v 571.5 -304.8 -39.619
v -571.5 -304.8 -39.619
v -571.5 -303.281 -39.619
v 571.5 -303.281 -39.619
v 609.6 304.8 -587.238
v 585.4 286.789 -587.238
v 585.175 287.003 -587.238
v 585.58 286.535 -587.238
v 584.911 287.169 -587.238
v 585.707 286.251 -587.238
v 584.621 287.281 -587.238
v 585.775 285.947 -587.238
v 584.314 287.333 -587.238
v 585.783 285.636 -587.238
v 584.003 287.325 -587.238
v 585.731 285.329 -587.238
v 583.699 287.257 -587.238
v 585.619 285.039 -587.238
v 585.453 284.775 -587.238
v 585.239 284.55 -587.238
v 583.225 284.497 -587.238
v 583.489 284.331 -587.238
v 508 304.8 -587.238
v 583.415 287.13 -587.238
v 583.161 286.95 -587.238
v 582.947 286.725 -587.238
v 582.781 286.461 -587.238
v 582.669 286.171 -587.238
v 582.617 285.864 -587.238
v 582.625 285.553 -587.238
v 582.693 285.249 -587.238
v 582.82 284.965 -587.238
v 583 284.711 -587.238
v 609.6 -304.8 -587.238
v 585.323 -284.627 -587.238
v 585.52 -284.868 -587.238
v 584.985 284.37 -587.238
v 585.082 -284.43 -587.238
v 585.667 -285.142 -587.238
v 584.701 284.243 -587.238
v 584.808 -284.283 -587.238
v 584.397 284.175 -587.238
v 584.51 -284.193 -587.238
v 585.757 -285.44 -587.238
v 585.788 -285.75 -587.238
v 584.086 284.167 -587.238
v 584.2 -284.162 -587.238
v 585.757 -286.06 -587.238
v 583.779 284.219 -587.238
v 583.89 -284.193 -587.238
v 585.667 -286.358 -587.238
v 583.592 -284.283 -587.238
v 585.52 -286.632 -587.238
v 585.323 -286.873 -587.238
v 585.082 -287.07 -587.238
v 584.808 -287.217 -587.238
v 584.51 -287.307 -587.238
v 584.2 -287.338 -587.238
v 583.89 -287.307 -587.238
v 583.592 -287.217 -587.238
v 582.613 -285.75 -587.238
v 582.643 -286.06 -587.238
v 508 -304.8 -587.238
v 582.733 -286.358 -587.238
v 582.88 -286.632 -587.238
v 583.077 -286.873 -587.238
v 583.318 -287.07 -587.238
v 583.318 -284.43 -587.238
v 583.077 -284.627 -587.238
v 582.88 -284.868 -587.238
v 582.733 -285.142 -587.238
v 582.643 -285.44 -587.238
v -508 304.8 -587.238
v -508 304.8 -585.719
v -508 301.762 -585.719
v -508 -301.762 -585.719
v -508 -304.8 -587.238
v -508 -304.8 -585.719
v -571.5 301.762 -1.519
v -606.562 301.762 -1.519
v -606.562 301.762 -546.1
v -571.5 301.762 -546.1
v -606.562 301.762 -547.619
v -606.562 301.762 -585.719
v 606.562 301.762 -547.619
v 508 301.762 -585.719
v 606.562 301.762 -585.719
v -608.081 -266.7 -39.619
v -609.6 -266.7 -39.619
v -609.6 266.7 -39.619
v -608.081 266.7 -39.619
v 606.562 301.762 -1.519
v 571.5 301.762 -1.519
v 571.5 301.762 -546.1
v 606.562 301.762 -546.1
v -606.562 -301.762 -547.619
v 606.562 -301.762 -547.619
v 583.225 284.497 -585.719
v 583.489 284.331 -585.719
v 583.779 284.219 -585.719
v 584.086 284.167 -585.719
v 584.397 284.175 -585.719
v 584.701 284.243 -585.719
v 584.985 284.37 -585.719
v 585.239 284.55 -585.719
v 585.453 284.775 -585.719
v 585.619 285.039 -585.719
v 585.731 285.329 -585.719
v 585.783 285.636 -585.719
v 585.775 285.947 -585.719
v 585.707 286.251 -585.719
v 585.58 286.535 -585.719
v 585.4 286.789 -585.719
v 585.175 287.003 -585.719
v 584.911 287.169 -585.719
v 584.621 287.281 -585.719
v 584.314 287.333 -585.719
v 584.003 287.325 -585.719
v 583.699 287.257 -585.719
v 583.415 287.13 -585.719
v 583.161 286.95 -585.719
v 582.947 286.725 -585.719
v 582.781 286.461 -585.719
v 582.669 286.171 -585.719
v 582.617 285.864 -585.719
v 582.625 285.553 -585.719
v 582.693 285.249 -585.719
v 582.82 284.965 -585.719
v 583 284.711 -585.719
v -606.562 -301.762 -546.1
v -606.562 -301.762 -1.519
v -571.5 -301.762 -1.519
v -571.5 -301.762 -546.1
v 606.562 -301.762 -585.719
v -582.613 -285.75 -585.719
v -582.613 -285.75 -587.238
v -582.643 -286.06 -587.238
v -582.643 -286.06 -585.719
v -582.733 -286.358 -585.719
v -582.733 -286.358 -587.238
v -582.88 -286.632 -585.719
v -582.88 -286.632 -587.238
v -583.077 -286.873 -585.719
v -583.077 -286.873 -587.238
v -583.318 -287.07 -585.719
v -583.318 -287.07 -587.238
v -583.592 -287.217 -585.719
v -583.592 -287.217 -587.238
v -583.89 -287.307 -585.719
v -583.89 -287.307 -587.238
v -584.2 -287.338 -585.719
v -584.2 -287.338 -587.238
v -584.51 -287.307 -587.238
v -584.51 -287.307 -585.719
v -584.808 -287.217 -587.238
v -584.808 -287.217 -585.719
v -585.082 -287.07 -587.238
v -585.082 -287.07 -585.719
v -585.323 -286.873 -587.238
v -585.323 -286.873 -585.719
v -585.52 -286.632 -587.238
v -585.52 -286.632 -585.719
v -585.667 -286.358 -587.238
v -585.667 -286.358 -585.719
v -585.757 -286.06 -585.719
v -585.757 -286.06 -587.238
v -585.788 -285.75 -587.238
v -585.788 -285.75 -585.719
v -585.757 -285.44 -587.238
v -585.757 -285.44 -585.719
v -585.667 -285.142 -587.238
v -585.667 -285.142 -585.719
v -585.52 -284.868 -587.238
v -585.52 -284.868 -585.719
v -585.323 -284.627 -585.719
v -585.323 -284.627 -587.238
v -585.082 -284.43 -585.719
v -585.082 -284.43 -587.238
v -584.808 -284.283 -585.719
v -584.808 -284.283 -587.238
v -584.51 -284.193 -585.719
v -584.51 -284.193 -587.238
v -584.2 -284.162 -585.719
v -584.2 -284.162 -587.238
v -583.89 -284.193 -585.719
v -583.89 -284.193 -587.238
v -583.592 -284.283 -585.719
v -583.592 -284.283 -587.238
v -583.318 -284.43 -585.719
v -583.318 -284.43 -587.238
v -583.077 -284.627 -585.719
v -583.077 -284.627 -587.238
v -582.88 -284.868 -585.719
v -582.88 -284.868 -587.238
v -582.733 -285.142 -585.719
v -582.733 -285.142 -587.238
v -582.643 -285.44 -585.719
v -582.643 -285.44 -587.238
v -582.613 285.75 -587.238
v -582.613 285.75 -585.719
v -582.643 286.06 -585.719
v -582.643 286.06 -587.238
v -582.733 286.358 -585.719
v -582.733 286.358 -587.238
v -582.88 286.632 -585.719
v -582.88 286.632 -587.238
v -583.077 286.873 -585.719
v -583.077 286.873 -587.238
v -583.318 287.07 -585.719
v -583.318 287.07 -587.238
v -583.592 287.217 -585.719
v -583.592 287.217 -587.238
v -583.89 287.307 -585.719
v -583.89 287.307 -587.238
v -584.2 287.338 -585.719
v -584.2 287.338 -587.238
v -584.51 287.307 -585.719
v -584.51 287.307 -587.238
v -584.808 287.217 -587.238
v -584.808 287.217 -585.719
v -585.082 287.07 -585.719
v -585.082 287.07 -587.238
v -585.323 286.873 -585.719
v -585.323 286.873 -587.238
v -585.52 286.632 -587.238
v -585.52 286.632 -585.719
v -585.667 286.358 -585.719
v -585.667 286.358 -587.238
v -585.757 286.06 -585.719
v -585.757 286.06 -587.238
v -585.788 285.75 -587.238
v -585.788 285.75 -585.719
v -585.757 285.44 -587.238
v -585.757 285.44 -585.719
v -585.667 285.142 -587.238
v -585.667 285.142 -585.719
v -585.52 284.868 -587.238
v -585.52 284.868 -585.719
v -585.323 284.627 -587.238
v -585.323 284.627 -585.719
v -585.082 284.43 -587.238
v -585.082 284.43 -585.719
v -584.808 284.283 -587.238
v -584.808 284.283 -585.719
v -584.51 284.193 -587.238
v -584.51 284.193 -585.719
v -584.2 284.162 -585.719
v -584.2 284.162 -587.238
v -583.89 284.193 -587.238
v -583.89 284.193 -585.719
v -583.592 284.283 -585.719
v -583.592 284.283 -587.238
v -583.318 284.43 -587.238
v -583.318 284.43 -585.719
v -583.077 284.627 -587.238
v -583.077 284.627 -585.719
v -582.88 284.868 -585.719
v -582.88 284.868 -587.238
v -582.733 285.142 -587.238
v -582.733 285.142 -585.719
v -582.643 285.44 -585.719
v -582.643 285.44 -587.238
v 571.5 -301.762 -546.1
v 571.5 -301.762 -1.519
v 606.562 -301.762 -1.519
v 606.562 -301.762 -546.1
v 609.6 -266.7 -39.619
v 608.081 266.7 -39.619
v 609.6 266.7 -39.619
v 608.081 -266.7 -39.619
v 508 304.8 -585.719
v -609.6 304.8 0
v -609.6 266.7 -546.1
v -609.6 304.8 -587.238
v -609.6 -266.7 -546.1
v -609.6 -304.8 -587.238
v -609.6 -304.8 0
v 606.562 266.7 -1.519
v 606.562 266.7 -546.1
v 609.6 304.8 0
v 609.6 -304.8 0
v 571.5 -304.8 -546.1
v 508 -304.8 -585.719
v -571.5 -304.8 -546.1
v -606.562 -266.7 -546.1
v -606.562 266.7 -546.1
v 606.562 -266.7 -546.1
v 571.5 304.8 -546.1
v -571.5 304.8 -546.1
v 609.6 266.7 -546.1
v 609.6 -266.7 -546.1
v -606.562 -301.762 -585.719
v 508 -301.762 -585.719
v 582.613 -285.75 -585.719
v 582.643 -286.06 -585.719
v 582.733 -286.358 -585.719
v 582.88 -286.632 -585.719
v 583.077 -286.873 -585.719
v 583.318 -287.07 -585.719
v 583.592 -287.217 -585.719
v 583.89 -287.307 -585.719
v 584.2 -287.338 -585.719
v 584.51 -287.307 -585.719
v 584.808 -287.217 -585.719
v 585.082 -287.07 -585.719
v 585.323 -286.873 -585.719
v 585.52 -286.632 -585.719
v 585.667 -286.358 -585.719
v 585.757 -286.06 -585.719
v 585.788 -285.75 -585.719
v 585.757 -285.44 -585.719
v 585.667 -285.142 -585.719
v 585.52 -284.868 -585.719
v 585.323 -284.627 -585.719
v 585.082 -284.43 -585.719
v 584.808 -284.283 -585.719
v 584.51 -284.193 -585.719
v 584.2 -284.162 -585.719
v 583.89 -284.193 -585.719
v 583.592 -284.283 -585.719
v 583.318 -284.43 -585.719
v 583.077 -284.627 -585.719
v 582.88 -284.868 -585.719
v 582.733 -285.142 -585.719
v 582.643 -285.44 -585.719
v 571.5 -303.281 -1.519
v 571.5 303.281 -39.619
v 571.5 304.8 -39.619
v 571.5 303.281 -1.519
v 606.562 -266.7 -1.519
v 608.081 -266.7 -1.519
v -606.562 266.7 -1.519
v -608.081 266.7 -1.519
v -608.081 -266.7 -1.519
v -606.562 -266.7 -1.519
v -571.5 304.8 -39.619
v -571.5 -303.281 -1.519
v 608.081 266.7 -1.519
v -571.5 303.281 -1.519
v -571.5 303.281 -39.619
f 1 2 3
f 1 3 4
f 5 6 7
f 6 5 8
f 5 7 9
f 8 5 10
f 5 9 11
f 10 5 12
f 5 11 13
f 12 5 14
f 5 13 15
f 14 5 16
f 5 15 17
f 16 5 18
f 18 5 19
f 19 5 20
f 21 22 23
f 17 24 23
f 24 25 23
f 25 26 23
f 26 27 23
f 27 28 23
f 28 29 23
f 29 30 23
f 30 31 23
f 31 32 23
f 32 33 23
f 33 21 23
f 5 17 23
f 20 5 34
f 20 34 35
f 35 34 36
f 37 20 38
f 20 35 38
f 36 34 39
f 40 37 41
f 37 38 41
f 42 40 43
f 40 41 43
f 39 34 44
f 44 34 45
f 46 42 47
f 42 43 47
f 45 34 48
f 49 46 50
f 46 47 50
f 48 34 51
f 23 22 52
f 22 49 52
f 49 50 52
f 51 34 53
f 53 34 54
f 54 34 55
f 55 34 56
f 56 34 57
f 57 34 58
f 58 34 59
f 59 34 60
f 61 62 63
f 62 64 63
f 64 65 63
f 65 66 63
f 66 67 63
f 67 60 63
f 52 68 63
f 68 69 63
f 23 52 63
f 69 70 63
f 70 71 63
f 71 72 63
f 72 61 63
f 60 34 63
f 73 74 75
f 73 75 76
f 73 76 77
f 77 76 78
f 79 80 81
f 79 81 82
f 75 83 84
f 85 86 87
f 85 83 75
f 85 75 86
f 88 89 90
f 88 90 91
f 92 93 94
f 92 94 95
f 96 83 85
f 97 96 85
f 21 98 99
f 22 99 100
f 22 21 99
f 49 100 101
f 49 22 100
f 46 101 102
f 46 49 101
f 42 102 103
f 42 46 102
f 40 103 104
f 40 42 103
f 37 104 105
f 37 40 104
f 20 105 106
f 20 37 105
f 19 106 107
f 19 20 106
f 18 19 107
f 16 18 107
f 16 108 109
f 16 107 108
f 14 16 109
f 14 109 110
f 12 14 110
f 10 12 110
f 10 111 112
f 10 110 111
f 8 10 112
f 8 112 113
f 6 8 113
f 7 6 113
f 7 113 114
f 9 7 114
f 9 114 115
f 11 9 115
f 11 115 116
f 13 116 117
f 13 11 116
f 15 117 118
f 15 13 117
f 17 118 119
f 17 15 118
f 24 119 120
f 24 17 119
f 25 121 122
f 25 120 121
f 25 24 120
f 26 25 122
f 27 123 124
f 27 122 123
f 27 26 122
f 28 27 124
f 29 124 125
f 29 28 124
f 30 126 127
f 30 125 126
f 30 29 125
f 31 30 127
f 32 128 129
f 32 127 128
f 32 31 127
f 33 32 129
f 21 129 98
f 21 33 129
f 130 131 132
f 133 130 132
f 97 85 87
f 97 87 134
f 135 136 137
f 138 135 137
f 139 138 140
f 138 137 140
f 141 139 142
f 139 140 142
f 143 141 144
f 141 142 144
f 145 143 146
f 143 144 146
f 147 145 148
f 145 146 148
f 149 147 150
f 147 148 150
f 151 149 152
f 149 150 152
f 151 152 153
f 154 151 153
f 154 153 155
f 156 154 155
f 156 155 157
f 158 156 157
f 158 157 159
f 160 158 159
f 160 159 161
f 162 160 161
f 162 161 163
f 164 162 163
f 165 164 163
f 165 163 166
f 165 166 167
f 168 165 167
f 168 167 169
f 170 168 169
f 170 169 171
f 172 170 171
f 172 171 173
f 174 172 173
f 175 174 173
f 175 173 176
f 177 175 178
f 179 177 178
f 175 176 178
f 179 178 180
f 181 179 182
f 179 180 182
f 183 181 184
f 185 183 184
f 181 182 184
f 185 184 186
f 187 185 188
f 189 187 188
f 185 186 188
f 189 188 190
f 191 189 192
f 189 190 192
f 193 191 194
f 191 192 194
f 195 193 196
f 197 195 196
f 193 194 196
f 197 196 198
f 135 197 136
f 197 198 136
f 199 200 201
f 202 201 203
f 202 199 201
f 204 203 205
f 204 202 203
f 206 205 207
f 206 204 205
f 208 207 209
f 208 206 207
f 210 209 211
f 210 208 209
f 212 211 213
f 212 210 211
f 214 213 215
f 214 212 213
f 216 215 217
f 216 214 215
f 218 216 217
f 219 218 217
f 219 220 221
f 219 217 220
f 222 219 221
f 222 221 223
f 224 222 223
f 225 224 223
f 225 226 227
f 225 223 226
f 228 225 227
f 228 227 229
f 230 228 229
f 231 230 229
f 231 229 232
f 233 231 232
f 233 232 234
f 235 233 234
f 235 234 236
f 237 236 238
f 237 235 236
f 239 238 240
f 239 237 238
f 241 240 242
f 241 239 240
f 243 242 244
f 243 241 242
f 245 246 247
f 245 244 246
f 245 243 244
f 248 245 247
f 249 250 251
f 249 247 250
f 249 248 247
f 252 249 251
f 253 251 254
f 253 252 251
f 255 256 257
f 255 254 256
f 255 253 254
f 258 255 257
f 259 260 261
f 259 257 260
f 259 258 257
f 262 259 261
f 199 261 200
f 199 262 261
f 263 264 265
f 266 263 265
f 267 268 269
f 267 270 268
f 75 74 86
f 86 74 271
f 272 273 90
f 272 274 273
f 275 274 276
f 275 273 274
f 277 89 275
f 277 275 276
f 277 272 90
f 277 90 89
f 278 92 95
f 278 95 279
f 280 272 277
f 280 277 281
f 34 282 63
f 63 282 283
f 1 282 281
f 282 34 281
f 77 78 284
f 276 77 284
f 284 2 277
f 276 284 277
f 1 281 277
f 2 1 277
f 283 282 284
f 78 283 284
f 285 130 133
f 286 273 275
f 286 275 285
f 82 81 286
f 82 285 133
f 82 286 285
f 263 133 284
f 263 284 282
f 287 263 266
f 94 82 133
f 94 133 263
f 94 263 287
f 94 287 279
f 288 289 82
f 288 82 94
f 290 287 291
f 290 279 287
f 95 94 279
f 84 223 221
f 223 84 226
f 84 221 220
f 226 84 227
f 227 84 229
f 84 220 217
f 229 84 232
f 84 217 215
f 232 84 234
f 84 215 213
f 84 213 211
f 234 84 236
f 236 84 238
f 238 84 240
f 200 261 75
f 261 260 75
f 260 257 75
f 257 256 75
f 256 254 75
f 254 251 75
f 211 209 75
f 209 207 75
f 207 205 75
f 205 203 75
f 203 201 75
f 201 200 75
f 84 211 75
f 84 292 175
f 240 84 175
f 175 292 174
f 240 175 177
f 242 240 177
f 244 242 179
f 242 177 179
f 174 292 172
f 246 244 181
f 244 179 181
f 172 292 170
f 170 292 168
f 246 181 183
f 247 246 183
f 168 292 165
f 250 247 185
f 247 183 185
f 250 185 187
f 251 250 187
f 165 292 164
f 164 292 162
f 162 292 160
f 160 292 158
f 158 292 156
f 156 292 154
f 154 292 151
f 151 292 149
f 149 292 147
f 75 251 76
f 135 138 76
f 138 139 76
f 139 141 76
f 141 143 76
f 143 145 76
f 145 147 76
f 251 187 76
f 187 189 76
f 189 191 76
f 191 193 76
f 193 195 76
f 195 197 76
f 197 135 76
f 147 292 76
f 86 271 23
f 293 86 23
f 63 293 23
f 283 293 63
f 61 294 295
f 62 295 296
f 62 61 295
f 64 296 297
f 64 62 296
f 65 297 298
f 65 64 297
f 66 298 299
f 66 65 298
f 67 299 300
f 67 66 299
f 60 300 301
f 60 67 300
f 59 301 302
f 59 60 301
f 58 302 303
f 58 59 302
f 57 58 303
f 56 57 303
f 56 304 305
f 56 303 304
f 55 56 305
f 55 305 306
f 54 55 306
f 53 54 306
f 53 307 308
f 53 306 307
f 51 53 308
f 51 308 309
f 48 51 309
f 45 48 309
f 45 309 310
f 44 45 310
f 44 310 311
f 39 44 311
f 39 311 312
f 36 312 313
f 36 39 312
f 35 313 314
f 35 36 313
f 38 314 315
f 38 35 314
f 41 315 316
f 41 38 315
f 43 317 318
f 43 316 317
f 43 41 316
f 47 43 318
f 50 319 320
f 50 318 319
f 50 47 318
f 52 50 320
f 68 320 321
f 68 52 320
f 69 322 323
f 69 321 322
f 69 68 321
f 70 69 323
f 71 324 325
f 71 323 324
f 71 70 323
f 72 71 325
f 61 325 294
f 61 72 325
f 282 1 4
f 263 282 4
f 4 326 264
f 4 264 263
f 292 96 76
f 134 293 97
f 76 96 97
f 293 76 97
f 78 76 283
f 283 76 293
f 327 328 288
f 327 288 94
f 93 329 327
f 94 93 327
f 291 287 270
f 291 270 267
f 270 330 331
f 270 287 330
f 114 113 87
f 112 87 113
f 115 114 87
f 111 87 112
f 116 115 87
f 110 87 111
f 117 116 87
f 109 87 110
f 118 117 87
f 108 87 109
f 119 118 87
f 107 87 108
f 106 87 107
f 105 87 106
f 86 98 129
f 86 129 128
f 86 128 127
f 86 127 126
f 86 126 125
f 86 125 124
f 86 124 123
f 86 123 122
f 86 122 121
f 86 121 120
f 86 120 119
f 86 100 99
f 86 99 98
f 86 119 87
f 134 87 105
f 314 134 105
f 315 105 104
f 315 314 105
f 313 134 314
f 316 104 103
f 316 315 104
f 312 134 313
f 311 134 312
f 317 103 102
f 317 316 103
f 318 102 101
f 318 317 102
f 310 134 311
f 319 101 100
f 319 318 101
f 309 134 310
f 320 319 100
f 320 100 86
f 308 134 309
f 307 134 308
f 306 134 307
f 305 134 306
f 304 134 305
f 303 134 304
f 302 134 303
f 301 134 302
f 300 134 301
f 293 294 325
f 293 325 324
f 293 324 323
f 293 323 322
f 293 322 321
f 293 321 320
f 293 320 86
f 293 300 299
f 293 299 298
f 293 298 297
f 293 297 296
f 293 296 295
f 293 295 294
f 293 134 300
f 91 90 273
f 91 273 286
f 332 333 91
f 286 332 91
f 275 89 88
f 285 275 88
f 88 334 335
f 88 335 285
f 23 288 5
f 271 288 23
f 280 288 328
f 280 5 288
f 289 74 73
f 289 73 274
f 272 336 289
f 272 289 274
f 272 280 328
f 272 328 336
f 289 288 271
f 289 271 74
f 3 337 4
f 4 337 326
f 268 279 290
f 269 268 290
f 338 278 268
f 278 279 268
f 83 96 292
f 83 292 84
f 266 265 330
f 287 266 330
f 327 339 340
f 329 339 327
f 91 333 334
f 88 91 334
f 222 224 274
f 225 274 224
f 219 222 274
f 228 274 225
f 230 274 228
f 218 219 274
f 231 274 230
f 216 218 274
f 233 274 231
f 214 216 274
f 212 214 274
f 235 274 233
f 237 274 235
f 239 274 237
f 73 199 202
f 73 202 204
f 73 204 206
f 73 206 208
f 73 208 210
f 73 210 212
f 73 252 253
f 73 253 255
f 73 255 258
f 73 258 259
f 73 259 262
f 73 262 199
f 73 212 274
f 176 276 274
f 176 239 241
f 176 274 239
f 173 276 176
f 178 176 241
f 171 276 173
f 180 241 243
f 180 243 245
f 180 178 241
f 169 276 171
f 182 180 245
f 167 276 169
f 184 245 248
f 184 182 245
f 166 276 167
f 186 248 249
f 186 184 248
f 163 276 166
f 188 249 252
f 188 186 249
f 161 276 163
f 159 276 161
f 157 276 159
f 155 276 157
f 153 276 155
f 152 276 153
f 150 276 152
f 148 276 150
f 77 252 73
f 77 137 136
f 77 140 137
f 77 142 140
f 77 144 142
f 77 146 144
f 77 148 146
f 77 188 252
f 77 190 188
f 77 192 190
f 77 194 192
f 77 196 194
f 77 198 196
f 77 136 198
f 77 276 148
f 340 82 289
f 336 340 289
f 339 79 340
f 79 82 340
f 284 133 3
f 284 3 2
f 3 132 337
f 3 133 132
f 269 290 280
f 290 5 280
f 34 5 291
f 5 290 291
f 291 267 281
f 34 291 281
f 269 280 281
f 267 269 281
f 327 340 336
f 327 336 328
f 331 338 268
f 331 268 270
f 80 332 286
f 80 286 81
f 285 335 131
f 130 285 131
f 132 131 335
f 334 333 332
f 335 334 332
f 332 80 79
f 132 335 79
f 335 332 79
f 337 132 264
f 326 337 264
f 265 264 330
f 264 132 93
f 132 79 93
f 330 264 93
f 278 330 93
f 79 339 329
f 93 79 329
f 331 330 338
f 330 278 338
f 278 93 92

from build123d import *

# Parameters (mm, degrees)
F0_W      = 1219.2
F0_H      = 609.6
F1_DEPTH  = 1.51892
F2_W      = 1219.2
F2_H      = 609.6
F2_W_2    = 1216.16216
F2_H_2    = 606.56216
F3_DEPTH  = 38.1
F5_DEPTH  = 584.2
F7_W      = 1219.2
F7_H      = 609.6
F8_DEPTH  = 1.51892
F9_W      = 1219.2
F9_H      = 609.6
F9_W_2    = 1213.12432
F9_H_2    = 603.52432
F10_DEPTH = 38.1
F11_W     = 101.6
F11_H     = 609.6
F12_DEPTH = 1.51892
F13_R     = 1.5875
F14_DEPTH = 1.651


# Not quite as in the source:
# - a pattern or mirror of a feature is missing from the dataset's text; its kind, count and spacing are read off the source's solid


with BuildPart() as f1:
    # F0 (on Top) → F1 (new body)
    with BuildSketch(Plane.XY):
        Rectangle(F0_W, F0_H)
    extrude(amount=-F1_DEPTH)

    # F2 (on face) → F3 (join)
    with BuildSketch(Plane(origin=(0, 0, -1.51892), x_dir=(1, 0, 0), z_dir=(0, 0, -1))):
        Rectangle(F2_W, F2_H)
        Rectangle(F2_W_2, F2_H_2, mode=Mode.SUBTRACT)
    extrude(amount=F3_DEPTH)

    # F4 (on face) → F5 (join)
    with BuildSketch(Plane(origin=(0, 0, -1.51892), x_dir=(1, 0, 0), z_dir=(0, 0, -1))):
        Polygon((-571.5, 301.76216), (-571.5, 304.8), (-609.6, 304.8), (-609.6, 266.7), (-606.56216, 266.7), (-606.56216, 301.76216), align=None)
        Polygon((571.5, 304.8), (571.5, 301.76216), (606.56216, 301.76216), (606.56216, 266.7), (609.6, 266.7), (609.6, 304.8), align=None)
    f5 = extrude(amount=F5_DEPTH)

    # F5_copies: F5 across plane
    add(f5.mirror(Plane.ZX))

    # F7 (on offset) → F8 (join)
    with BuildSketch(Plane.XY.offset(-546.1)):
        Rectangle(F7_W, F7_H)
    extrude(amount=-F8_DEPTH)

    # F9 (on face) → F10 (join)
    with BuildSketch(Plane(origin=(0, 0, -547.61892), x_dir=(1, 0, 0), z_dir=(0, 0, -1))):
        Rectangle(F9_W, F9_H)
        Rectangle(F9_W_2, F9_H_2, mode=Mode.SUBTRACT)
    extrude(amount=F10_DEPTH)

    # F11 (on face) → F12 (join)
    with BuildSketch(Plane(origin=(0, 0, -585.71892), x_dir=(1, 0, 0), z_dir=(0, 0, -1))):
        with Locations((-558.8, 0)):
            Rectangle(F11_W, F11_H)
    f12 = extrude(amount=F12_DEPTH)

    # F12_copies: F12 across plane
    add(f12.mirror(Plane(origin=(0, 0, 0), x_dir=(0, 0, 1), z_dir=(1, 0, 0))))

    # F13 (on face) → F14 (cut)
    with BuildSketch(Plane(origin=(0, 0, -587.23784), x_dir=(1, 0, 0), z_dir=(0, 0, -1))):
        with Locations((-584.2, 285.75)):
            Circle(F13_R)
    f14 = extrude(amount=-F14_DEPTH, mode=Mode.SUBTRACT)

    # F14_copies: F14 across plane
    add(f14.mirror(Plane(origin=(0, 0, 0), x_dir=(0, 0, 1), z_dir=(1, 0, 0))), mode=Mode.SUBTRACT)

    # F14_copies1: F14 across plane
    add(f14.mirror(Plane.ZX), mode=Mode.SUBTRACT)

    # F14_copies2: F14 across plane
    add(f14.mirror(Plane(origin=(0, 0, 0), x_dir=(-0.4393852473, 0.8982987278, 0), z_dir=(0.8982987278, 0.4393852473, 0))), mode=Mode.SUBTRACT)


solid = f1.part
